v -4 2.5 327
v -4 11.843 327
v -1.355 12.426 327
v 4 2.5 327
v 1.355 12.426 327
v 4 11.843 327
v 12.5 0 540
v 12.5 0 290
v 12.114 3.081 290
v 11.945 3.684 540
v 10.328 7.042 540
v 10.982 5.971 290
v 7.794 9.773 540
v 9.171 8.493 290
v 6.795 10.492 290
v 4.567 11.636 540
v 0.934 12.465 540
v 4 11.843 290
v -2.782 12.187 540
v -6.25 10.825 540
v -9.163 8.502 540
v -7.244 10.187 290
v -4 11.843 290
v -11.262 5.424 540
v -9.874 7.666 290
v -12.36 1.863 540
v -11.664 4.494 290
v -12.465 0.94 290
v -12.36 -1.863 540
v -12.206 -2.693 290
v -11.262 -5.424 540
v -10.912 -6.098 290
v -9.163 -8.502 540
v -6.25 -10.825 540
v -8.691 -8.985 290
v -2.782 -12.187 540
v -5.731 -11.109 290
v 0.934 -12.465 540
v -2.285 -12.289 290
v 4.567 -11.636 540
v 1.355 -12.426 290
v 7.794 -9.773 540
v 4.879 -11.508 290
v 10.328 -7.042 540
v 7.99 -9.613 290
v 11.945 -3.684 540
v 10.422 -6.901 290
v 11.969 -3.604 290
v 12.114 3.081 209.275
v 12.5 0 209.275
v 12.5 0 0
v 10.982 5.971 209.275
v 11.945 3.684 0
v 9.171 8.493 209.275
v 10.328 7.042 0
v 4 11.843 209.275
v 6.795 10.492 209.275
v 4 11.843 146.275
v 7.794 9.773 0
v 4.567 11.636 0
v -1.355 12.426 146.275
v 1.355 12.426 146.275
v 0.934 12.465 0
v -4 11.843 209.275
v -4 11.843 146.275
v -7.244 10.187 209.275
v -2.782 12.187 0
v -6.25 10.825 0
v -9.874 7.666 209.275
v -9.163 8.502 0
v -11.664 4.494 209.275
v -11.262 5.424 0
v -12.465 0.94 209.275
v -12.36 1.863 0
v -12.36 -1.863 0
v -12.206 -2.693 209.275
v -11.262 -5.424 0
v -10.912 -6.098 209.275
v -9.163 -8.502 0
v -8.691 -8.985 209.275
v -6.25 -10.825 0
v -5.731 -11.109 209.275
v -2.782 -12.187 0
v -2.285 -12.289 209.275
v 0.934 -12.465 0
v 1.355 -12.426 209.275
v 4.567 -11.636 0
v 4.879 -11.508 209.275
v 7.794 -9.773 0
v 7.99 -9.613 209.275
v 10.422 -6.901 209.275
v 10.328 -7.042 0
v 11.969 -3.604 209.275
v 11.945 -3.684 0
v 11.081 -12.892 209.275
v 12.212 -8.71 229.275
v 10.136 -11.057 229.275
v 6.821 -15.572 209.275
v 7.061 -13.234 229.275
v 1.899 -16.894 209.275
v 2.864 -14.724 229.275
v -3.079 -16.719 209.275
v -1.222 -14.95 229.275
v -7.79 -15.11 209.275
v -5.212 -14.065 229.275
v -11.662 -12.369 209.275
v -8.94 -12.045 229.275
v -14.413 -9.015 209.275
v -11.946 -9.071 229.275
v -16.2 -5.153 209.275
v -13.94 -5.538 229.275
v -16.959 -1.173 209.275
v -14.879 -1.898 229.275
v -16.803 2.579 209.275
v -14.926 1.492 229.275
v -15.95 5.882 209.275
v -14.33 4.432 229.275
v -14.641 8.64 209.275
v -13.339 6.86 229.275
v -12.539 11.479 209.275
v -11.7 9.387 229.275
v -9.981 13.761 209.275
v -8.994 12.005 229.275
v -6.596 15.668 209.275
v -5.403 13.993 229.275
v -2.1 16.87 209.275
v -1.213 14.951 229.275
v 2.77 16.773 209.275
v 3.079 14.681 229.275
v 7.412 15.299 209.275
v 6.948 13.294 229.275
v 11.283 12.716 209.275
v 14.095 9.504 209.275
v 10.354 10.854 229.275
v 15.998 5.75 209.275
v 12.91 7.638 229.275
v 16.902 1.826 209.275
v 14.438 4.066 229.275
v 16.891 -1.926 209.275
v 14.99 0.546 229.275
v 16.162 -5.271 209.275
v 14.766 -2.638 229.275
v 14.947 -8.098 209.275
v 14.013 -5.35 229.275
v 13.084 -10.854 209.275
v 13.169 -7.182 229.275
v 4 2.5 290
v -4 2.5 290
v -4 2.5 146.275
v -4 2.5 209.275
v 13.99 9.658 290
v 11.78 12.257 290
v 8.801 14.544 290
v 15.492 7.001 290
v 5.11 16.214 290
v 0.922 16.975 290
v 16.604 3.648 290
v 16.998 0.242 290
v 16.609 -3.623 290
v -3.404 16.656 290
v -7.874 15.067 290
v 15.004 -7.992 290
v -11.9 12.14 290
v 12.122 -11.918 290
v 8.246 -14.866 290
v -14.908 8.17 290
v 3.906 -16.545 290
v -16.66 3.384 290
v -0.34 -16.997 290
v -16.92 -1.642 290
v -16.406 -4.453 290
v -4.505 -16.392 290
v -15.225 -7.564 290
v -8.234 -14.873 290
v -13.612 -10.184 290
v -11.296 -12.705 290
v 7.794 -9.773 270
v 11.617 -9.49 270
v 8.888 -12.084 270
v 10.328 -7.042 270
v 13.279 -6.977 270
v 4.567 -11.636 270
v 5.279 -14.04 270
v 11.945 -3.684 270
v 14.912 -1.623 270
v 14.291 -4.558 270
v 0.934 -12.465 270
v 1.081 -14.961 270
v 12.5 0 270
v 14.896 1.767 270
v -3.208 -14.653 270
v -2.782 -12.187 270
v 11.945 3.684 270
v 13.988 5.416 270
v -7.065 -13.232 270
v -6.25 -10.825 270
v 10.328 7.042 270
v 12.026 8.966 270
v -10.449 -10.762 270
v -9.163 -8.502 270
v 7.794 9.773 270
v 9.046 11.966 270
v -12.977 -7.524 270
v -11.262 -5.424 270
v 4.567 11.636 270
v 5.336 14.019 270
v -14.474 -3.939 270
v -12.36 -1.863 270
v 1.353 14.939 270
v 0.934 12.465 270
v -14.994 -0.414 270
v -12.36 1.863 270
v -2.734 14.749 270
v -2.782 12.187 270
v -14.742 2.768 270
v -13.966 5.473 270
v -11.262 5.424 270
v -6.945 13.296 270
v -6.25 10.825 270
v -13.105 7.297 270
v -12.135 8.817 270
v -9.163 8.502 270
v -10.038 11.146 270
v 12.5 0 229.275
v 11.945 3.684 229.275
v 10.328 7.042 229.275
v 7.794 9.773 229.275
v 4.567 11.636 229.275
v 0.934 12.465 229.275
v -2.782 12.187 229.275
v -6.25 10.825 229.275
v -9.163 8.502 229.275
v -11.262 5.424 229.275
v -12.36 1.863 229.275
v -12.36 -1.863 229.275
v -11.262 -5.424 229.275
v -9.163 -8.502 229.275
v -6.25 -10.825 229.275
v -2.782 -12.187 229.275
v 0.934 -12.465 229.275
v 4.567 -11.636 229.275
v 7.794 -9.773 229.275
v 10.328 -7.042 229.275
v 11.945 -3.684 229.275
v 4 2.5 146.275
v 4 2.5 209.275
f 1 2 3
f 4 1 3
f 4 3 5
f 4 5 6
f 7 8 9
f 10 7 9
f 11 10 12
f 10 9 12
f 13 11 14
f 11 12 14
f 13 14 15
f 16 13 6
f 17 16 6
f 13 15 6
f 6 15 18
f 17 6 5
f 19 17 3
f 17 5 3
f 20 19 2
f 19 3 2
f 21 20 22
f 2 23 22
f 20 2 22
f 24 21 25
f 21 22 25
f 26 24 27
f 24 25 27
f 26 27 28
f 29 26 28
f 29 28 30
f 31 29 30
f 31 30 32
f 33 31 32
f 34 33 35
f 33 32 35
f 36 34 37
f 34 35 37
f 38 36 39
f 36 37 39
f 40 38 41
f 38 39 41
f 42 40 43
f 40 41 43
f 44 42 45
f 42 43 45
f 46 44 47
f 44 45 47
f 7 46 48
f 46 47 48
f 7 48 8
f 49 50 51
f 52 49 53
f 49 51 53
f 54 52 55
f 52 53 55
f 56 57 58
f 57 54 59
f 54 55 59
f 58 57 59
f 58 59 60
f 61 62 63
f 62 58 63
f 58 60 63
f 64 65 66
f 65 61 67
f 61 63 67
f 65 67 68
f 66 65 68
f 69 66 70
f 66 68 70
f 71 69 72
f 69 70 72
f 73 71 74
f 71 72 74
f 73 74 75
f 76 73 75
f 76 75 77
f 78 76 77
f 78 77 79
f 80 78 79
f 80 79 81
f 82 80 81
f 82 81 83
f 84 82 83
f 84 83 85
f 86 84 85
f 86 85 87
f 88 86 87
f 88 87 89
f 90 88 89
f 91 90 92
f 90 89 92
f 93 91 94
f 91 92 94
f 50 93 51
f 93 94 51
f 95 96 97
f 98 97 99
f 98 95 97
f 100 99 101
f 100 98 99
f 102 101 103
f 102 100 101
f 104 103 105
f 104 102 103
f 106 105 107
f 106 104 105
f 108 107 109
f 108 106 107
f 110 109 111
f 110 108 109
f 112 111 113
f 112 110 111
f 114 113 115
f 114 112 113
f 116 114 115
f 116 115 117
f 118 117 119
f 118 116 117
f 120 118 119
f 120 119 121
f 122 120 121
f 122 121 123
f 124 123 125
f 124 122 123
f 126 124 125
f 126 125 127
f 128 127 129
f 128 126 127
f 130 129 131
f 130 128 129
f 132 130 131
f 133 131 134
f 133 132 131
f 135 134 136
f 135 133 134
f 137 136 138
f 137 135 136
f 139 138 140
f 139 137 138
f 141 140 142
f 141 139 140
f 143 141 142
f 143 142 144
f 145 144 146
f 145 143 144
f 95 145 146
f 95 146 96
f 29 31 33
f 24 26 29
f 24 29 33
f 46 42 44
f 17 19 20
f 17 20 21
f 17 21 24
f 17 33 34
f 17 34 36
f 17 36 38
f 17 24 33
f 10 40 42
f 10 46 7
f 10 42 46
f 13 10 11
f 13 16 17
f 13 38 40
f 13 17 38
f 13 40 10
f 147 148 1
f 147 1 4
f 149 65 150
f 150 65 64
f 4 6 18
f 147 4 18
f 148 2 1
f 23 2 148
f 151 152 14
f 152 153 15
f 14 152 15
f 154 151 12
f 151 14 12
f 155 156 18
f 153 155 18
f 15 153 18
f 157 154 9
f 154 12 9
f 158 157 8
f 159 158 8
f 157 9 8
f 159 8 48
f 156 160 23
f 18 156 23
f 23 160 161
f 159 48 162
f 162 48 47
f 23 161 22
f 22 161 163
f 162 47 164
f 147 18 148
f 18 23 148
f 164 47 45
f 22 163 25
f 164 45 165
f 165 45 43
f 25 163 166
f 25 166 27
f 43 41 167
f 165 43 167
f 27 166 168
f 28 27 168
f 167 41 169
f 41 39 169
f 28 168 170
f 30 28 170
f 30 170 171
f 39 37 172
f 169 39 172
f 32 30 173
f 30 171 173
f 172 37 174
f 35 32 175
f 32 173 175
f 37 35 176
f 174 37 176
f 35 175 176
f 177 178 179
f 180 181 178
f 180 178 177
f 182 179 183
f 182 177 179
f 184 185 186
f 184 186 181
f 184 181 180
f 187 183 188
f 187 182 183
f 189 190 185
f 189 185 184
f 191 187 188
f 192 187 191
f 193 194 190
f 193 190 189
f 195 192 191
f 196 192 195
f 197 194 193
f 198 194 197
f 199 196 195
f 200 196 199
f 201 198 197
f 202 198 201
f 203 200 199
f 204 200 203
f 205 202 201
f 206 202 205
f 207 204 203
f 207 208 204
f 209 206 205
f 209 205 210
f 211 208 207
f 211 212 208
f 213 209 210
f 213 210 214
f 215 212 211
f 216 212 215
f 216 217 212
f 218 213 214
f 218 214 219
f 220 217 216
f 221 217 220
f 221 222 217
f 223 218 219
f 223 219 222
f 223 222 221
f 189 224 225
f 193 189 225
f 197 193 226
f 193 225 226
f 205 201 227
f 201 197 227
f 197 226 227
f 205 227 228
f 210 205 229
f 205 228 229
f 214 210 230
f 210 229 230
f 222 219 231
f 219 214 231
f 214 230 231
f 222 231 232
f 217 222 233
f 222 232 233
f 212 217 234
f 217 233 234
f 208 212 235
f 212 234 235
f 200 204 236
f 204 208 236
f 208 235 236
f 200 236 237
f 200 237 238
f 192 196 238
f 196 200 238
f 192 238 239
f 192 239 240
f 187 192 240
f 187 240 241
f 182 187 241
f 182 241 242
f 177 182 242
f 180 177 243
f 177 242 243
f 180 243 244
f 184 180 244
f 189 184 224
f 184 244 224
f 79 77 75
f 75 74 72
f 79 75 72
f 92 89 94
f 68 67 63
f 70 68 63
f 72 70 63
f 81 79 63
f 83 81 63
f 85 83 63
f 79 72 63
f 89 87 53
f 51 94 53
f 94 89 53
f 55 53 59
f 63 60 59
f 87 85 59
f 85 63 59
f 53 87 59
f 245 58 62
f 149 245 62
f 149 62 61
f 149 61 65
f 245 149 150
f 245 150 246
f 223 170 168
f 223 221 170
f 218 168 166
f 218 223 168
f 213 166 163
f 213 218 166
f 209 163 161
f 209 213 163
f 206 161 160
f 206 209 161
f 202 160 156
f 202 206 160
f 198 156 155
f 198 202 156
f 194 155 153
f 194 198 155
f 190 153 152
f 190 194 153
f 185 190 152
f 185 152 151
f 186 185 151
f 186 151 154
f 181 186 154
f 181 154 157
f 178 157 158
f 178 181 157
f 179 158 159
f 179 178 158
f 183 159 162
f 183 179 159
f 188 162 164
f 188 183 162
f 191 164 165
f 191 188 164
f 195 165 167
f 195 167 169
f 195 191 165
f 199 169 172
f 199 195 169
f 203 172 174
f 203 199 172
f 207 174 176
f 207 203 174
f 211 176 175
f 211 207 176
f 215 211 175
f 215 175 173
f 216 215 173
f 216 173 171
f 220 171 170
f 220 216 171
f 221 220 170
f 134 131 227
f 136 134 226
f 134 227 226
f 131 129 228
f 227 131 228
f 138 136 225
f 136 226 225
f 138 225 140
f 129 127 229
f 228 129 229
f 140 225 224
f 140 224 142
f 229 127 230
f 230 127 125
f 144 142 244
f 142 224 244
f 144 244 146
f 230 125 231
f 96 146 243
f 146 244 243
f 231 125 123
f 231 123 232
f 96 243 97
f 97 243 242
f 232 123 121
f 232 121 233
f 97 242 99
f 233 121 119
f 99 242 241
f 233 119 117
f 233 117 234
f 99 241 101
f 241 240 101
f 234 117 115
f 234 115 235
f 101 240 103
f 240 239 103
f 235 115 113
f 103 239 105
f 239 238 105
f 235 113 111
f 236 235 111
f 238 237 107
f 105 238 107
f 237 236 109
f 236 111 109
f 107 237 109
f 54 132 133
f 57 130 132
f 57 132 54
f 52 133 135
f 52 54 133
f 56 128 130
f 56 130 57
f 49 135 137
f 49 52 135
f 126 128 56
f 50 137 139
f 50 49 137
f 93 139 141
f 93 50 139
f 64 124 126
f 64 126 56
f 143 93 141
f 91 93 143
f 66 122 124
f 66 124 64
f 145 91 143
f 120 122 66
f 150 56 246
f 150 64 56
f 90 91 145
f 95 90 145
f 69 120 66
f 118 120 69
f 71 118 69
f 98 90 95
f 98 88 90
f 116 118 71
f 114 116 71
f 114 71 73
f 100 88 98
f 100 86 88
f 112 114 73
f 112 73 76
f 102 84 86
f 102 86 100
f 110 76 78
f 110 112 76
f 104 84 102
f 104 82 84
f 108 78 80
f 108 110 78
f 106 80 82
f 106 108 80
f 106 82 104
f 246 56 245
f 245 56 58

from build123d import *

# Parameters (mm, degrees)
SKETCH1_R           = 12.5
BOSS_EXTRUDE1_DEPTH = 500
SKETCH6_R           = 12.5
BOSS_EXTRUDE2_DEPTH = 40
CUT_EXTRUDE1_DEPTH  = 10
SKETCH8_W           = 8
SKETCH8_H           = 37
CUT_EXTRUDE2_DEPTH  = 10


with BuildPart() as part:
    # Sketch1 → Boss-Extrude1 (new body)
    with BuildSketch(Plane.XY):
        Circle(SKETCH1_R)
    extrude(amount=BOSS_EXTRUDE1_DEPTH)

    # Loft1: read off the stored shape, not the designer's step
    # Loft1: loft between two sections, ruled curve by curve
    loft1_from = [
        Edge.make_bspline([(12.212340856, -8.709691775, 229.275), (-5.207042693, -33.134373487, 229.275), (-29.631724406, -15.714989938, 229.275), (-12.212340856, 8.709691775, 229.275), (5.207042693, 33.134373487, 229.275), (29.631724406, 15.714989938, 229.275), (12.212340856, -8.709691775, 229.275)], [0, 0, 0, 0, 0.5, 0.5, 0.5, 1, 1, 1, 1], 3, [1, 0.333333333, 0.333333333, 1, 0.333333333, 0.333333333, 1]),
    ]
    loft1_to = [
        Edge.make_bspline([(11.08117333, -12.89215256, 209.275), (-14.70313179, -35.05449922, 209.275), (-36.86547845, -9.2701941, 209.275), (-11.08117333, 12.89215256, 209.275), (14.70313179, 35.05449922, 209.275), (36.86547845, 9.2701941, 209.275), (11.08117333, -12.89215256, 209.275)], [0, 0, 0, 0, 0.5, 0.5, 0.5, 1, 1, 1, 1], 3, [1, 0.333333333, 0.333333333, 1, 0.333333333, 0.333333333, 1]),
    ]
    loft1 = Solid(Shell([*[Face.make_surface_from_curves(loft1_from[k], loft1_to[k]) for k in range(1)], Face(Wire(loft1_from)), Face(Wire(loft1_to))]))
    add(loft1)

    # Loft2: read off the stored shape, not the designer's step
    # Loft2: loft between two sections, ruled curve by curve
    loft2_from = [
        Edge.make_bspline([(-16.92047911, -1.642372271, 290), (-20.205223652, 32.19858595, 290), (13.635734568, 35.483330492, 290), (16.92047911, 1.642372271, 290), (20.205223652, -32.19858595, 290), (-13.635734568, -35.483330492, 290), (-16.92047911, -1.642372271, 290)], [0, 0, 0, 0, 0.5, 0.5, 0.5, 1, 1, 1, 1], 3, [1, 0.333333333, 0.333333333, 1, 0.333333333, 0.333333333, 1]),
    ]
    loft2_to = [
        Edge.make_bspline([(-12.135254916, 8.816778784, 270), (5.498302653, 33.087288616, 270), (29.768812484, 15.453731047, 270), (12.135254916, -8.816778784, 270), (-5.498302653, -33.087288616, 270), (-29.768812484, -15.453731047, 270), (-12.135254916, 8.816778784, 270)], [0, 0, 0, 0, 0.5, 0.5, 0.5, 1, 1, 1, 1], 3, [1, 0.333333333, 0.333333333, 1, 0.333333333, 0.333333333, 1]),
    ]
    loft2 = Solid(Shell([*[Face.make_surface_from_curves(loft2_from[k], loft2_to[k]) for k in range(1)], Face(Wire(loft2_from)), Face(Wire(loft2_to))]))
    add(loft2)

    # Sketch6 → Boss-Extrude2 (add)
    with BuildSketch(Plane.XY.offset(500)):
        Circle(SKETCH6_R)
    extrude(amount=BOSS_EXTRUDE2_DEPTH)

    # Sketch9 → Cut-Extrude1 (cut)
    with BuildSketch(Plane(origin=(0, 12.5, 0), x_dir=(1, 0, 0), z_dir=(0, 1, 0))):
        Polygon((-4, -146.275), (-4, -209.275), (0, -209.275), (4, -209.275), (4, -146.275), align=None)
    extrude(amount=-CUT_EXTRUDE1_DEPTH, mode=Mode.SUBTRACT)

    # Sketch8 → Cut-Extrude2 (cut)
    with BuildSketch(Plane(origin=(0, 12.5, 0), x_dir=(1, 0, 0), z_dir=(0, 1, 0))):
        with Locations((0, -308.5)):
            Rectangle(SKETCH8_W, SKETCH8_H)
    extrude(amount=-CUT_EXTRUDE2_DEPTH, mode=Mode.SUBTRACT)


solid = part.part
